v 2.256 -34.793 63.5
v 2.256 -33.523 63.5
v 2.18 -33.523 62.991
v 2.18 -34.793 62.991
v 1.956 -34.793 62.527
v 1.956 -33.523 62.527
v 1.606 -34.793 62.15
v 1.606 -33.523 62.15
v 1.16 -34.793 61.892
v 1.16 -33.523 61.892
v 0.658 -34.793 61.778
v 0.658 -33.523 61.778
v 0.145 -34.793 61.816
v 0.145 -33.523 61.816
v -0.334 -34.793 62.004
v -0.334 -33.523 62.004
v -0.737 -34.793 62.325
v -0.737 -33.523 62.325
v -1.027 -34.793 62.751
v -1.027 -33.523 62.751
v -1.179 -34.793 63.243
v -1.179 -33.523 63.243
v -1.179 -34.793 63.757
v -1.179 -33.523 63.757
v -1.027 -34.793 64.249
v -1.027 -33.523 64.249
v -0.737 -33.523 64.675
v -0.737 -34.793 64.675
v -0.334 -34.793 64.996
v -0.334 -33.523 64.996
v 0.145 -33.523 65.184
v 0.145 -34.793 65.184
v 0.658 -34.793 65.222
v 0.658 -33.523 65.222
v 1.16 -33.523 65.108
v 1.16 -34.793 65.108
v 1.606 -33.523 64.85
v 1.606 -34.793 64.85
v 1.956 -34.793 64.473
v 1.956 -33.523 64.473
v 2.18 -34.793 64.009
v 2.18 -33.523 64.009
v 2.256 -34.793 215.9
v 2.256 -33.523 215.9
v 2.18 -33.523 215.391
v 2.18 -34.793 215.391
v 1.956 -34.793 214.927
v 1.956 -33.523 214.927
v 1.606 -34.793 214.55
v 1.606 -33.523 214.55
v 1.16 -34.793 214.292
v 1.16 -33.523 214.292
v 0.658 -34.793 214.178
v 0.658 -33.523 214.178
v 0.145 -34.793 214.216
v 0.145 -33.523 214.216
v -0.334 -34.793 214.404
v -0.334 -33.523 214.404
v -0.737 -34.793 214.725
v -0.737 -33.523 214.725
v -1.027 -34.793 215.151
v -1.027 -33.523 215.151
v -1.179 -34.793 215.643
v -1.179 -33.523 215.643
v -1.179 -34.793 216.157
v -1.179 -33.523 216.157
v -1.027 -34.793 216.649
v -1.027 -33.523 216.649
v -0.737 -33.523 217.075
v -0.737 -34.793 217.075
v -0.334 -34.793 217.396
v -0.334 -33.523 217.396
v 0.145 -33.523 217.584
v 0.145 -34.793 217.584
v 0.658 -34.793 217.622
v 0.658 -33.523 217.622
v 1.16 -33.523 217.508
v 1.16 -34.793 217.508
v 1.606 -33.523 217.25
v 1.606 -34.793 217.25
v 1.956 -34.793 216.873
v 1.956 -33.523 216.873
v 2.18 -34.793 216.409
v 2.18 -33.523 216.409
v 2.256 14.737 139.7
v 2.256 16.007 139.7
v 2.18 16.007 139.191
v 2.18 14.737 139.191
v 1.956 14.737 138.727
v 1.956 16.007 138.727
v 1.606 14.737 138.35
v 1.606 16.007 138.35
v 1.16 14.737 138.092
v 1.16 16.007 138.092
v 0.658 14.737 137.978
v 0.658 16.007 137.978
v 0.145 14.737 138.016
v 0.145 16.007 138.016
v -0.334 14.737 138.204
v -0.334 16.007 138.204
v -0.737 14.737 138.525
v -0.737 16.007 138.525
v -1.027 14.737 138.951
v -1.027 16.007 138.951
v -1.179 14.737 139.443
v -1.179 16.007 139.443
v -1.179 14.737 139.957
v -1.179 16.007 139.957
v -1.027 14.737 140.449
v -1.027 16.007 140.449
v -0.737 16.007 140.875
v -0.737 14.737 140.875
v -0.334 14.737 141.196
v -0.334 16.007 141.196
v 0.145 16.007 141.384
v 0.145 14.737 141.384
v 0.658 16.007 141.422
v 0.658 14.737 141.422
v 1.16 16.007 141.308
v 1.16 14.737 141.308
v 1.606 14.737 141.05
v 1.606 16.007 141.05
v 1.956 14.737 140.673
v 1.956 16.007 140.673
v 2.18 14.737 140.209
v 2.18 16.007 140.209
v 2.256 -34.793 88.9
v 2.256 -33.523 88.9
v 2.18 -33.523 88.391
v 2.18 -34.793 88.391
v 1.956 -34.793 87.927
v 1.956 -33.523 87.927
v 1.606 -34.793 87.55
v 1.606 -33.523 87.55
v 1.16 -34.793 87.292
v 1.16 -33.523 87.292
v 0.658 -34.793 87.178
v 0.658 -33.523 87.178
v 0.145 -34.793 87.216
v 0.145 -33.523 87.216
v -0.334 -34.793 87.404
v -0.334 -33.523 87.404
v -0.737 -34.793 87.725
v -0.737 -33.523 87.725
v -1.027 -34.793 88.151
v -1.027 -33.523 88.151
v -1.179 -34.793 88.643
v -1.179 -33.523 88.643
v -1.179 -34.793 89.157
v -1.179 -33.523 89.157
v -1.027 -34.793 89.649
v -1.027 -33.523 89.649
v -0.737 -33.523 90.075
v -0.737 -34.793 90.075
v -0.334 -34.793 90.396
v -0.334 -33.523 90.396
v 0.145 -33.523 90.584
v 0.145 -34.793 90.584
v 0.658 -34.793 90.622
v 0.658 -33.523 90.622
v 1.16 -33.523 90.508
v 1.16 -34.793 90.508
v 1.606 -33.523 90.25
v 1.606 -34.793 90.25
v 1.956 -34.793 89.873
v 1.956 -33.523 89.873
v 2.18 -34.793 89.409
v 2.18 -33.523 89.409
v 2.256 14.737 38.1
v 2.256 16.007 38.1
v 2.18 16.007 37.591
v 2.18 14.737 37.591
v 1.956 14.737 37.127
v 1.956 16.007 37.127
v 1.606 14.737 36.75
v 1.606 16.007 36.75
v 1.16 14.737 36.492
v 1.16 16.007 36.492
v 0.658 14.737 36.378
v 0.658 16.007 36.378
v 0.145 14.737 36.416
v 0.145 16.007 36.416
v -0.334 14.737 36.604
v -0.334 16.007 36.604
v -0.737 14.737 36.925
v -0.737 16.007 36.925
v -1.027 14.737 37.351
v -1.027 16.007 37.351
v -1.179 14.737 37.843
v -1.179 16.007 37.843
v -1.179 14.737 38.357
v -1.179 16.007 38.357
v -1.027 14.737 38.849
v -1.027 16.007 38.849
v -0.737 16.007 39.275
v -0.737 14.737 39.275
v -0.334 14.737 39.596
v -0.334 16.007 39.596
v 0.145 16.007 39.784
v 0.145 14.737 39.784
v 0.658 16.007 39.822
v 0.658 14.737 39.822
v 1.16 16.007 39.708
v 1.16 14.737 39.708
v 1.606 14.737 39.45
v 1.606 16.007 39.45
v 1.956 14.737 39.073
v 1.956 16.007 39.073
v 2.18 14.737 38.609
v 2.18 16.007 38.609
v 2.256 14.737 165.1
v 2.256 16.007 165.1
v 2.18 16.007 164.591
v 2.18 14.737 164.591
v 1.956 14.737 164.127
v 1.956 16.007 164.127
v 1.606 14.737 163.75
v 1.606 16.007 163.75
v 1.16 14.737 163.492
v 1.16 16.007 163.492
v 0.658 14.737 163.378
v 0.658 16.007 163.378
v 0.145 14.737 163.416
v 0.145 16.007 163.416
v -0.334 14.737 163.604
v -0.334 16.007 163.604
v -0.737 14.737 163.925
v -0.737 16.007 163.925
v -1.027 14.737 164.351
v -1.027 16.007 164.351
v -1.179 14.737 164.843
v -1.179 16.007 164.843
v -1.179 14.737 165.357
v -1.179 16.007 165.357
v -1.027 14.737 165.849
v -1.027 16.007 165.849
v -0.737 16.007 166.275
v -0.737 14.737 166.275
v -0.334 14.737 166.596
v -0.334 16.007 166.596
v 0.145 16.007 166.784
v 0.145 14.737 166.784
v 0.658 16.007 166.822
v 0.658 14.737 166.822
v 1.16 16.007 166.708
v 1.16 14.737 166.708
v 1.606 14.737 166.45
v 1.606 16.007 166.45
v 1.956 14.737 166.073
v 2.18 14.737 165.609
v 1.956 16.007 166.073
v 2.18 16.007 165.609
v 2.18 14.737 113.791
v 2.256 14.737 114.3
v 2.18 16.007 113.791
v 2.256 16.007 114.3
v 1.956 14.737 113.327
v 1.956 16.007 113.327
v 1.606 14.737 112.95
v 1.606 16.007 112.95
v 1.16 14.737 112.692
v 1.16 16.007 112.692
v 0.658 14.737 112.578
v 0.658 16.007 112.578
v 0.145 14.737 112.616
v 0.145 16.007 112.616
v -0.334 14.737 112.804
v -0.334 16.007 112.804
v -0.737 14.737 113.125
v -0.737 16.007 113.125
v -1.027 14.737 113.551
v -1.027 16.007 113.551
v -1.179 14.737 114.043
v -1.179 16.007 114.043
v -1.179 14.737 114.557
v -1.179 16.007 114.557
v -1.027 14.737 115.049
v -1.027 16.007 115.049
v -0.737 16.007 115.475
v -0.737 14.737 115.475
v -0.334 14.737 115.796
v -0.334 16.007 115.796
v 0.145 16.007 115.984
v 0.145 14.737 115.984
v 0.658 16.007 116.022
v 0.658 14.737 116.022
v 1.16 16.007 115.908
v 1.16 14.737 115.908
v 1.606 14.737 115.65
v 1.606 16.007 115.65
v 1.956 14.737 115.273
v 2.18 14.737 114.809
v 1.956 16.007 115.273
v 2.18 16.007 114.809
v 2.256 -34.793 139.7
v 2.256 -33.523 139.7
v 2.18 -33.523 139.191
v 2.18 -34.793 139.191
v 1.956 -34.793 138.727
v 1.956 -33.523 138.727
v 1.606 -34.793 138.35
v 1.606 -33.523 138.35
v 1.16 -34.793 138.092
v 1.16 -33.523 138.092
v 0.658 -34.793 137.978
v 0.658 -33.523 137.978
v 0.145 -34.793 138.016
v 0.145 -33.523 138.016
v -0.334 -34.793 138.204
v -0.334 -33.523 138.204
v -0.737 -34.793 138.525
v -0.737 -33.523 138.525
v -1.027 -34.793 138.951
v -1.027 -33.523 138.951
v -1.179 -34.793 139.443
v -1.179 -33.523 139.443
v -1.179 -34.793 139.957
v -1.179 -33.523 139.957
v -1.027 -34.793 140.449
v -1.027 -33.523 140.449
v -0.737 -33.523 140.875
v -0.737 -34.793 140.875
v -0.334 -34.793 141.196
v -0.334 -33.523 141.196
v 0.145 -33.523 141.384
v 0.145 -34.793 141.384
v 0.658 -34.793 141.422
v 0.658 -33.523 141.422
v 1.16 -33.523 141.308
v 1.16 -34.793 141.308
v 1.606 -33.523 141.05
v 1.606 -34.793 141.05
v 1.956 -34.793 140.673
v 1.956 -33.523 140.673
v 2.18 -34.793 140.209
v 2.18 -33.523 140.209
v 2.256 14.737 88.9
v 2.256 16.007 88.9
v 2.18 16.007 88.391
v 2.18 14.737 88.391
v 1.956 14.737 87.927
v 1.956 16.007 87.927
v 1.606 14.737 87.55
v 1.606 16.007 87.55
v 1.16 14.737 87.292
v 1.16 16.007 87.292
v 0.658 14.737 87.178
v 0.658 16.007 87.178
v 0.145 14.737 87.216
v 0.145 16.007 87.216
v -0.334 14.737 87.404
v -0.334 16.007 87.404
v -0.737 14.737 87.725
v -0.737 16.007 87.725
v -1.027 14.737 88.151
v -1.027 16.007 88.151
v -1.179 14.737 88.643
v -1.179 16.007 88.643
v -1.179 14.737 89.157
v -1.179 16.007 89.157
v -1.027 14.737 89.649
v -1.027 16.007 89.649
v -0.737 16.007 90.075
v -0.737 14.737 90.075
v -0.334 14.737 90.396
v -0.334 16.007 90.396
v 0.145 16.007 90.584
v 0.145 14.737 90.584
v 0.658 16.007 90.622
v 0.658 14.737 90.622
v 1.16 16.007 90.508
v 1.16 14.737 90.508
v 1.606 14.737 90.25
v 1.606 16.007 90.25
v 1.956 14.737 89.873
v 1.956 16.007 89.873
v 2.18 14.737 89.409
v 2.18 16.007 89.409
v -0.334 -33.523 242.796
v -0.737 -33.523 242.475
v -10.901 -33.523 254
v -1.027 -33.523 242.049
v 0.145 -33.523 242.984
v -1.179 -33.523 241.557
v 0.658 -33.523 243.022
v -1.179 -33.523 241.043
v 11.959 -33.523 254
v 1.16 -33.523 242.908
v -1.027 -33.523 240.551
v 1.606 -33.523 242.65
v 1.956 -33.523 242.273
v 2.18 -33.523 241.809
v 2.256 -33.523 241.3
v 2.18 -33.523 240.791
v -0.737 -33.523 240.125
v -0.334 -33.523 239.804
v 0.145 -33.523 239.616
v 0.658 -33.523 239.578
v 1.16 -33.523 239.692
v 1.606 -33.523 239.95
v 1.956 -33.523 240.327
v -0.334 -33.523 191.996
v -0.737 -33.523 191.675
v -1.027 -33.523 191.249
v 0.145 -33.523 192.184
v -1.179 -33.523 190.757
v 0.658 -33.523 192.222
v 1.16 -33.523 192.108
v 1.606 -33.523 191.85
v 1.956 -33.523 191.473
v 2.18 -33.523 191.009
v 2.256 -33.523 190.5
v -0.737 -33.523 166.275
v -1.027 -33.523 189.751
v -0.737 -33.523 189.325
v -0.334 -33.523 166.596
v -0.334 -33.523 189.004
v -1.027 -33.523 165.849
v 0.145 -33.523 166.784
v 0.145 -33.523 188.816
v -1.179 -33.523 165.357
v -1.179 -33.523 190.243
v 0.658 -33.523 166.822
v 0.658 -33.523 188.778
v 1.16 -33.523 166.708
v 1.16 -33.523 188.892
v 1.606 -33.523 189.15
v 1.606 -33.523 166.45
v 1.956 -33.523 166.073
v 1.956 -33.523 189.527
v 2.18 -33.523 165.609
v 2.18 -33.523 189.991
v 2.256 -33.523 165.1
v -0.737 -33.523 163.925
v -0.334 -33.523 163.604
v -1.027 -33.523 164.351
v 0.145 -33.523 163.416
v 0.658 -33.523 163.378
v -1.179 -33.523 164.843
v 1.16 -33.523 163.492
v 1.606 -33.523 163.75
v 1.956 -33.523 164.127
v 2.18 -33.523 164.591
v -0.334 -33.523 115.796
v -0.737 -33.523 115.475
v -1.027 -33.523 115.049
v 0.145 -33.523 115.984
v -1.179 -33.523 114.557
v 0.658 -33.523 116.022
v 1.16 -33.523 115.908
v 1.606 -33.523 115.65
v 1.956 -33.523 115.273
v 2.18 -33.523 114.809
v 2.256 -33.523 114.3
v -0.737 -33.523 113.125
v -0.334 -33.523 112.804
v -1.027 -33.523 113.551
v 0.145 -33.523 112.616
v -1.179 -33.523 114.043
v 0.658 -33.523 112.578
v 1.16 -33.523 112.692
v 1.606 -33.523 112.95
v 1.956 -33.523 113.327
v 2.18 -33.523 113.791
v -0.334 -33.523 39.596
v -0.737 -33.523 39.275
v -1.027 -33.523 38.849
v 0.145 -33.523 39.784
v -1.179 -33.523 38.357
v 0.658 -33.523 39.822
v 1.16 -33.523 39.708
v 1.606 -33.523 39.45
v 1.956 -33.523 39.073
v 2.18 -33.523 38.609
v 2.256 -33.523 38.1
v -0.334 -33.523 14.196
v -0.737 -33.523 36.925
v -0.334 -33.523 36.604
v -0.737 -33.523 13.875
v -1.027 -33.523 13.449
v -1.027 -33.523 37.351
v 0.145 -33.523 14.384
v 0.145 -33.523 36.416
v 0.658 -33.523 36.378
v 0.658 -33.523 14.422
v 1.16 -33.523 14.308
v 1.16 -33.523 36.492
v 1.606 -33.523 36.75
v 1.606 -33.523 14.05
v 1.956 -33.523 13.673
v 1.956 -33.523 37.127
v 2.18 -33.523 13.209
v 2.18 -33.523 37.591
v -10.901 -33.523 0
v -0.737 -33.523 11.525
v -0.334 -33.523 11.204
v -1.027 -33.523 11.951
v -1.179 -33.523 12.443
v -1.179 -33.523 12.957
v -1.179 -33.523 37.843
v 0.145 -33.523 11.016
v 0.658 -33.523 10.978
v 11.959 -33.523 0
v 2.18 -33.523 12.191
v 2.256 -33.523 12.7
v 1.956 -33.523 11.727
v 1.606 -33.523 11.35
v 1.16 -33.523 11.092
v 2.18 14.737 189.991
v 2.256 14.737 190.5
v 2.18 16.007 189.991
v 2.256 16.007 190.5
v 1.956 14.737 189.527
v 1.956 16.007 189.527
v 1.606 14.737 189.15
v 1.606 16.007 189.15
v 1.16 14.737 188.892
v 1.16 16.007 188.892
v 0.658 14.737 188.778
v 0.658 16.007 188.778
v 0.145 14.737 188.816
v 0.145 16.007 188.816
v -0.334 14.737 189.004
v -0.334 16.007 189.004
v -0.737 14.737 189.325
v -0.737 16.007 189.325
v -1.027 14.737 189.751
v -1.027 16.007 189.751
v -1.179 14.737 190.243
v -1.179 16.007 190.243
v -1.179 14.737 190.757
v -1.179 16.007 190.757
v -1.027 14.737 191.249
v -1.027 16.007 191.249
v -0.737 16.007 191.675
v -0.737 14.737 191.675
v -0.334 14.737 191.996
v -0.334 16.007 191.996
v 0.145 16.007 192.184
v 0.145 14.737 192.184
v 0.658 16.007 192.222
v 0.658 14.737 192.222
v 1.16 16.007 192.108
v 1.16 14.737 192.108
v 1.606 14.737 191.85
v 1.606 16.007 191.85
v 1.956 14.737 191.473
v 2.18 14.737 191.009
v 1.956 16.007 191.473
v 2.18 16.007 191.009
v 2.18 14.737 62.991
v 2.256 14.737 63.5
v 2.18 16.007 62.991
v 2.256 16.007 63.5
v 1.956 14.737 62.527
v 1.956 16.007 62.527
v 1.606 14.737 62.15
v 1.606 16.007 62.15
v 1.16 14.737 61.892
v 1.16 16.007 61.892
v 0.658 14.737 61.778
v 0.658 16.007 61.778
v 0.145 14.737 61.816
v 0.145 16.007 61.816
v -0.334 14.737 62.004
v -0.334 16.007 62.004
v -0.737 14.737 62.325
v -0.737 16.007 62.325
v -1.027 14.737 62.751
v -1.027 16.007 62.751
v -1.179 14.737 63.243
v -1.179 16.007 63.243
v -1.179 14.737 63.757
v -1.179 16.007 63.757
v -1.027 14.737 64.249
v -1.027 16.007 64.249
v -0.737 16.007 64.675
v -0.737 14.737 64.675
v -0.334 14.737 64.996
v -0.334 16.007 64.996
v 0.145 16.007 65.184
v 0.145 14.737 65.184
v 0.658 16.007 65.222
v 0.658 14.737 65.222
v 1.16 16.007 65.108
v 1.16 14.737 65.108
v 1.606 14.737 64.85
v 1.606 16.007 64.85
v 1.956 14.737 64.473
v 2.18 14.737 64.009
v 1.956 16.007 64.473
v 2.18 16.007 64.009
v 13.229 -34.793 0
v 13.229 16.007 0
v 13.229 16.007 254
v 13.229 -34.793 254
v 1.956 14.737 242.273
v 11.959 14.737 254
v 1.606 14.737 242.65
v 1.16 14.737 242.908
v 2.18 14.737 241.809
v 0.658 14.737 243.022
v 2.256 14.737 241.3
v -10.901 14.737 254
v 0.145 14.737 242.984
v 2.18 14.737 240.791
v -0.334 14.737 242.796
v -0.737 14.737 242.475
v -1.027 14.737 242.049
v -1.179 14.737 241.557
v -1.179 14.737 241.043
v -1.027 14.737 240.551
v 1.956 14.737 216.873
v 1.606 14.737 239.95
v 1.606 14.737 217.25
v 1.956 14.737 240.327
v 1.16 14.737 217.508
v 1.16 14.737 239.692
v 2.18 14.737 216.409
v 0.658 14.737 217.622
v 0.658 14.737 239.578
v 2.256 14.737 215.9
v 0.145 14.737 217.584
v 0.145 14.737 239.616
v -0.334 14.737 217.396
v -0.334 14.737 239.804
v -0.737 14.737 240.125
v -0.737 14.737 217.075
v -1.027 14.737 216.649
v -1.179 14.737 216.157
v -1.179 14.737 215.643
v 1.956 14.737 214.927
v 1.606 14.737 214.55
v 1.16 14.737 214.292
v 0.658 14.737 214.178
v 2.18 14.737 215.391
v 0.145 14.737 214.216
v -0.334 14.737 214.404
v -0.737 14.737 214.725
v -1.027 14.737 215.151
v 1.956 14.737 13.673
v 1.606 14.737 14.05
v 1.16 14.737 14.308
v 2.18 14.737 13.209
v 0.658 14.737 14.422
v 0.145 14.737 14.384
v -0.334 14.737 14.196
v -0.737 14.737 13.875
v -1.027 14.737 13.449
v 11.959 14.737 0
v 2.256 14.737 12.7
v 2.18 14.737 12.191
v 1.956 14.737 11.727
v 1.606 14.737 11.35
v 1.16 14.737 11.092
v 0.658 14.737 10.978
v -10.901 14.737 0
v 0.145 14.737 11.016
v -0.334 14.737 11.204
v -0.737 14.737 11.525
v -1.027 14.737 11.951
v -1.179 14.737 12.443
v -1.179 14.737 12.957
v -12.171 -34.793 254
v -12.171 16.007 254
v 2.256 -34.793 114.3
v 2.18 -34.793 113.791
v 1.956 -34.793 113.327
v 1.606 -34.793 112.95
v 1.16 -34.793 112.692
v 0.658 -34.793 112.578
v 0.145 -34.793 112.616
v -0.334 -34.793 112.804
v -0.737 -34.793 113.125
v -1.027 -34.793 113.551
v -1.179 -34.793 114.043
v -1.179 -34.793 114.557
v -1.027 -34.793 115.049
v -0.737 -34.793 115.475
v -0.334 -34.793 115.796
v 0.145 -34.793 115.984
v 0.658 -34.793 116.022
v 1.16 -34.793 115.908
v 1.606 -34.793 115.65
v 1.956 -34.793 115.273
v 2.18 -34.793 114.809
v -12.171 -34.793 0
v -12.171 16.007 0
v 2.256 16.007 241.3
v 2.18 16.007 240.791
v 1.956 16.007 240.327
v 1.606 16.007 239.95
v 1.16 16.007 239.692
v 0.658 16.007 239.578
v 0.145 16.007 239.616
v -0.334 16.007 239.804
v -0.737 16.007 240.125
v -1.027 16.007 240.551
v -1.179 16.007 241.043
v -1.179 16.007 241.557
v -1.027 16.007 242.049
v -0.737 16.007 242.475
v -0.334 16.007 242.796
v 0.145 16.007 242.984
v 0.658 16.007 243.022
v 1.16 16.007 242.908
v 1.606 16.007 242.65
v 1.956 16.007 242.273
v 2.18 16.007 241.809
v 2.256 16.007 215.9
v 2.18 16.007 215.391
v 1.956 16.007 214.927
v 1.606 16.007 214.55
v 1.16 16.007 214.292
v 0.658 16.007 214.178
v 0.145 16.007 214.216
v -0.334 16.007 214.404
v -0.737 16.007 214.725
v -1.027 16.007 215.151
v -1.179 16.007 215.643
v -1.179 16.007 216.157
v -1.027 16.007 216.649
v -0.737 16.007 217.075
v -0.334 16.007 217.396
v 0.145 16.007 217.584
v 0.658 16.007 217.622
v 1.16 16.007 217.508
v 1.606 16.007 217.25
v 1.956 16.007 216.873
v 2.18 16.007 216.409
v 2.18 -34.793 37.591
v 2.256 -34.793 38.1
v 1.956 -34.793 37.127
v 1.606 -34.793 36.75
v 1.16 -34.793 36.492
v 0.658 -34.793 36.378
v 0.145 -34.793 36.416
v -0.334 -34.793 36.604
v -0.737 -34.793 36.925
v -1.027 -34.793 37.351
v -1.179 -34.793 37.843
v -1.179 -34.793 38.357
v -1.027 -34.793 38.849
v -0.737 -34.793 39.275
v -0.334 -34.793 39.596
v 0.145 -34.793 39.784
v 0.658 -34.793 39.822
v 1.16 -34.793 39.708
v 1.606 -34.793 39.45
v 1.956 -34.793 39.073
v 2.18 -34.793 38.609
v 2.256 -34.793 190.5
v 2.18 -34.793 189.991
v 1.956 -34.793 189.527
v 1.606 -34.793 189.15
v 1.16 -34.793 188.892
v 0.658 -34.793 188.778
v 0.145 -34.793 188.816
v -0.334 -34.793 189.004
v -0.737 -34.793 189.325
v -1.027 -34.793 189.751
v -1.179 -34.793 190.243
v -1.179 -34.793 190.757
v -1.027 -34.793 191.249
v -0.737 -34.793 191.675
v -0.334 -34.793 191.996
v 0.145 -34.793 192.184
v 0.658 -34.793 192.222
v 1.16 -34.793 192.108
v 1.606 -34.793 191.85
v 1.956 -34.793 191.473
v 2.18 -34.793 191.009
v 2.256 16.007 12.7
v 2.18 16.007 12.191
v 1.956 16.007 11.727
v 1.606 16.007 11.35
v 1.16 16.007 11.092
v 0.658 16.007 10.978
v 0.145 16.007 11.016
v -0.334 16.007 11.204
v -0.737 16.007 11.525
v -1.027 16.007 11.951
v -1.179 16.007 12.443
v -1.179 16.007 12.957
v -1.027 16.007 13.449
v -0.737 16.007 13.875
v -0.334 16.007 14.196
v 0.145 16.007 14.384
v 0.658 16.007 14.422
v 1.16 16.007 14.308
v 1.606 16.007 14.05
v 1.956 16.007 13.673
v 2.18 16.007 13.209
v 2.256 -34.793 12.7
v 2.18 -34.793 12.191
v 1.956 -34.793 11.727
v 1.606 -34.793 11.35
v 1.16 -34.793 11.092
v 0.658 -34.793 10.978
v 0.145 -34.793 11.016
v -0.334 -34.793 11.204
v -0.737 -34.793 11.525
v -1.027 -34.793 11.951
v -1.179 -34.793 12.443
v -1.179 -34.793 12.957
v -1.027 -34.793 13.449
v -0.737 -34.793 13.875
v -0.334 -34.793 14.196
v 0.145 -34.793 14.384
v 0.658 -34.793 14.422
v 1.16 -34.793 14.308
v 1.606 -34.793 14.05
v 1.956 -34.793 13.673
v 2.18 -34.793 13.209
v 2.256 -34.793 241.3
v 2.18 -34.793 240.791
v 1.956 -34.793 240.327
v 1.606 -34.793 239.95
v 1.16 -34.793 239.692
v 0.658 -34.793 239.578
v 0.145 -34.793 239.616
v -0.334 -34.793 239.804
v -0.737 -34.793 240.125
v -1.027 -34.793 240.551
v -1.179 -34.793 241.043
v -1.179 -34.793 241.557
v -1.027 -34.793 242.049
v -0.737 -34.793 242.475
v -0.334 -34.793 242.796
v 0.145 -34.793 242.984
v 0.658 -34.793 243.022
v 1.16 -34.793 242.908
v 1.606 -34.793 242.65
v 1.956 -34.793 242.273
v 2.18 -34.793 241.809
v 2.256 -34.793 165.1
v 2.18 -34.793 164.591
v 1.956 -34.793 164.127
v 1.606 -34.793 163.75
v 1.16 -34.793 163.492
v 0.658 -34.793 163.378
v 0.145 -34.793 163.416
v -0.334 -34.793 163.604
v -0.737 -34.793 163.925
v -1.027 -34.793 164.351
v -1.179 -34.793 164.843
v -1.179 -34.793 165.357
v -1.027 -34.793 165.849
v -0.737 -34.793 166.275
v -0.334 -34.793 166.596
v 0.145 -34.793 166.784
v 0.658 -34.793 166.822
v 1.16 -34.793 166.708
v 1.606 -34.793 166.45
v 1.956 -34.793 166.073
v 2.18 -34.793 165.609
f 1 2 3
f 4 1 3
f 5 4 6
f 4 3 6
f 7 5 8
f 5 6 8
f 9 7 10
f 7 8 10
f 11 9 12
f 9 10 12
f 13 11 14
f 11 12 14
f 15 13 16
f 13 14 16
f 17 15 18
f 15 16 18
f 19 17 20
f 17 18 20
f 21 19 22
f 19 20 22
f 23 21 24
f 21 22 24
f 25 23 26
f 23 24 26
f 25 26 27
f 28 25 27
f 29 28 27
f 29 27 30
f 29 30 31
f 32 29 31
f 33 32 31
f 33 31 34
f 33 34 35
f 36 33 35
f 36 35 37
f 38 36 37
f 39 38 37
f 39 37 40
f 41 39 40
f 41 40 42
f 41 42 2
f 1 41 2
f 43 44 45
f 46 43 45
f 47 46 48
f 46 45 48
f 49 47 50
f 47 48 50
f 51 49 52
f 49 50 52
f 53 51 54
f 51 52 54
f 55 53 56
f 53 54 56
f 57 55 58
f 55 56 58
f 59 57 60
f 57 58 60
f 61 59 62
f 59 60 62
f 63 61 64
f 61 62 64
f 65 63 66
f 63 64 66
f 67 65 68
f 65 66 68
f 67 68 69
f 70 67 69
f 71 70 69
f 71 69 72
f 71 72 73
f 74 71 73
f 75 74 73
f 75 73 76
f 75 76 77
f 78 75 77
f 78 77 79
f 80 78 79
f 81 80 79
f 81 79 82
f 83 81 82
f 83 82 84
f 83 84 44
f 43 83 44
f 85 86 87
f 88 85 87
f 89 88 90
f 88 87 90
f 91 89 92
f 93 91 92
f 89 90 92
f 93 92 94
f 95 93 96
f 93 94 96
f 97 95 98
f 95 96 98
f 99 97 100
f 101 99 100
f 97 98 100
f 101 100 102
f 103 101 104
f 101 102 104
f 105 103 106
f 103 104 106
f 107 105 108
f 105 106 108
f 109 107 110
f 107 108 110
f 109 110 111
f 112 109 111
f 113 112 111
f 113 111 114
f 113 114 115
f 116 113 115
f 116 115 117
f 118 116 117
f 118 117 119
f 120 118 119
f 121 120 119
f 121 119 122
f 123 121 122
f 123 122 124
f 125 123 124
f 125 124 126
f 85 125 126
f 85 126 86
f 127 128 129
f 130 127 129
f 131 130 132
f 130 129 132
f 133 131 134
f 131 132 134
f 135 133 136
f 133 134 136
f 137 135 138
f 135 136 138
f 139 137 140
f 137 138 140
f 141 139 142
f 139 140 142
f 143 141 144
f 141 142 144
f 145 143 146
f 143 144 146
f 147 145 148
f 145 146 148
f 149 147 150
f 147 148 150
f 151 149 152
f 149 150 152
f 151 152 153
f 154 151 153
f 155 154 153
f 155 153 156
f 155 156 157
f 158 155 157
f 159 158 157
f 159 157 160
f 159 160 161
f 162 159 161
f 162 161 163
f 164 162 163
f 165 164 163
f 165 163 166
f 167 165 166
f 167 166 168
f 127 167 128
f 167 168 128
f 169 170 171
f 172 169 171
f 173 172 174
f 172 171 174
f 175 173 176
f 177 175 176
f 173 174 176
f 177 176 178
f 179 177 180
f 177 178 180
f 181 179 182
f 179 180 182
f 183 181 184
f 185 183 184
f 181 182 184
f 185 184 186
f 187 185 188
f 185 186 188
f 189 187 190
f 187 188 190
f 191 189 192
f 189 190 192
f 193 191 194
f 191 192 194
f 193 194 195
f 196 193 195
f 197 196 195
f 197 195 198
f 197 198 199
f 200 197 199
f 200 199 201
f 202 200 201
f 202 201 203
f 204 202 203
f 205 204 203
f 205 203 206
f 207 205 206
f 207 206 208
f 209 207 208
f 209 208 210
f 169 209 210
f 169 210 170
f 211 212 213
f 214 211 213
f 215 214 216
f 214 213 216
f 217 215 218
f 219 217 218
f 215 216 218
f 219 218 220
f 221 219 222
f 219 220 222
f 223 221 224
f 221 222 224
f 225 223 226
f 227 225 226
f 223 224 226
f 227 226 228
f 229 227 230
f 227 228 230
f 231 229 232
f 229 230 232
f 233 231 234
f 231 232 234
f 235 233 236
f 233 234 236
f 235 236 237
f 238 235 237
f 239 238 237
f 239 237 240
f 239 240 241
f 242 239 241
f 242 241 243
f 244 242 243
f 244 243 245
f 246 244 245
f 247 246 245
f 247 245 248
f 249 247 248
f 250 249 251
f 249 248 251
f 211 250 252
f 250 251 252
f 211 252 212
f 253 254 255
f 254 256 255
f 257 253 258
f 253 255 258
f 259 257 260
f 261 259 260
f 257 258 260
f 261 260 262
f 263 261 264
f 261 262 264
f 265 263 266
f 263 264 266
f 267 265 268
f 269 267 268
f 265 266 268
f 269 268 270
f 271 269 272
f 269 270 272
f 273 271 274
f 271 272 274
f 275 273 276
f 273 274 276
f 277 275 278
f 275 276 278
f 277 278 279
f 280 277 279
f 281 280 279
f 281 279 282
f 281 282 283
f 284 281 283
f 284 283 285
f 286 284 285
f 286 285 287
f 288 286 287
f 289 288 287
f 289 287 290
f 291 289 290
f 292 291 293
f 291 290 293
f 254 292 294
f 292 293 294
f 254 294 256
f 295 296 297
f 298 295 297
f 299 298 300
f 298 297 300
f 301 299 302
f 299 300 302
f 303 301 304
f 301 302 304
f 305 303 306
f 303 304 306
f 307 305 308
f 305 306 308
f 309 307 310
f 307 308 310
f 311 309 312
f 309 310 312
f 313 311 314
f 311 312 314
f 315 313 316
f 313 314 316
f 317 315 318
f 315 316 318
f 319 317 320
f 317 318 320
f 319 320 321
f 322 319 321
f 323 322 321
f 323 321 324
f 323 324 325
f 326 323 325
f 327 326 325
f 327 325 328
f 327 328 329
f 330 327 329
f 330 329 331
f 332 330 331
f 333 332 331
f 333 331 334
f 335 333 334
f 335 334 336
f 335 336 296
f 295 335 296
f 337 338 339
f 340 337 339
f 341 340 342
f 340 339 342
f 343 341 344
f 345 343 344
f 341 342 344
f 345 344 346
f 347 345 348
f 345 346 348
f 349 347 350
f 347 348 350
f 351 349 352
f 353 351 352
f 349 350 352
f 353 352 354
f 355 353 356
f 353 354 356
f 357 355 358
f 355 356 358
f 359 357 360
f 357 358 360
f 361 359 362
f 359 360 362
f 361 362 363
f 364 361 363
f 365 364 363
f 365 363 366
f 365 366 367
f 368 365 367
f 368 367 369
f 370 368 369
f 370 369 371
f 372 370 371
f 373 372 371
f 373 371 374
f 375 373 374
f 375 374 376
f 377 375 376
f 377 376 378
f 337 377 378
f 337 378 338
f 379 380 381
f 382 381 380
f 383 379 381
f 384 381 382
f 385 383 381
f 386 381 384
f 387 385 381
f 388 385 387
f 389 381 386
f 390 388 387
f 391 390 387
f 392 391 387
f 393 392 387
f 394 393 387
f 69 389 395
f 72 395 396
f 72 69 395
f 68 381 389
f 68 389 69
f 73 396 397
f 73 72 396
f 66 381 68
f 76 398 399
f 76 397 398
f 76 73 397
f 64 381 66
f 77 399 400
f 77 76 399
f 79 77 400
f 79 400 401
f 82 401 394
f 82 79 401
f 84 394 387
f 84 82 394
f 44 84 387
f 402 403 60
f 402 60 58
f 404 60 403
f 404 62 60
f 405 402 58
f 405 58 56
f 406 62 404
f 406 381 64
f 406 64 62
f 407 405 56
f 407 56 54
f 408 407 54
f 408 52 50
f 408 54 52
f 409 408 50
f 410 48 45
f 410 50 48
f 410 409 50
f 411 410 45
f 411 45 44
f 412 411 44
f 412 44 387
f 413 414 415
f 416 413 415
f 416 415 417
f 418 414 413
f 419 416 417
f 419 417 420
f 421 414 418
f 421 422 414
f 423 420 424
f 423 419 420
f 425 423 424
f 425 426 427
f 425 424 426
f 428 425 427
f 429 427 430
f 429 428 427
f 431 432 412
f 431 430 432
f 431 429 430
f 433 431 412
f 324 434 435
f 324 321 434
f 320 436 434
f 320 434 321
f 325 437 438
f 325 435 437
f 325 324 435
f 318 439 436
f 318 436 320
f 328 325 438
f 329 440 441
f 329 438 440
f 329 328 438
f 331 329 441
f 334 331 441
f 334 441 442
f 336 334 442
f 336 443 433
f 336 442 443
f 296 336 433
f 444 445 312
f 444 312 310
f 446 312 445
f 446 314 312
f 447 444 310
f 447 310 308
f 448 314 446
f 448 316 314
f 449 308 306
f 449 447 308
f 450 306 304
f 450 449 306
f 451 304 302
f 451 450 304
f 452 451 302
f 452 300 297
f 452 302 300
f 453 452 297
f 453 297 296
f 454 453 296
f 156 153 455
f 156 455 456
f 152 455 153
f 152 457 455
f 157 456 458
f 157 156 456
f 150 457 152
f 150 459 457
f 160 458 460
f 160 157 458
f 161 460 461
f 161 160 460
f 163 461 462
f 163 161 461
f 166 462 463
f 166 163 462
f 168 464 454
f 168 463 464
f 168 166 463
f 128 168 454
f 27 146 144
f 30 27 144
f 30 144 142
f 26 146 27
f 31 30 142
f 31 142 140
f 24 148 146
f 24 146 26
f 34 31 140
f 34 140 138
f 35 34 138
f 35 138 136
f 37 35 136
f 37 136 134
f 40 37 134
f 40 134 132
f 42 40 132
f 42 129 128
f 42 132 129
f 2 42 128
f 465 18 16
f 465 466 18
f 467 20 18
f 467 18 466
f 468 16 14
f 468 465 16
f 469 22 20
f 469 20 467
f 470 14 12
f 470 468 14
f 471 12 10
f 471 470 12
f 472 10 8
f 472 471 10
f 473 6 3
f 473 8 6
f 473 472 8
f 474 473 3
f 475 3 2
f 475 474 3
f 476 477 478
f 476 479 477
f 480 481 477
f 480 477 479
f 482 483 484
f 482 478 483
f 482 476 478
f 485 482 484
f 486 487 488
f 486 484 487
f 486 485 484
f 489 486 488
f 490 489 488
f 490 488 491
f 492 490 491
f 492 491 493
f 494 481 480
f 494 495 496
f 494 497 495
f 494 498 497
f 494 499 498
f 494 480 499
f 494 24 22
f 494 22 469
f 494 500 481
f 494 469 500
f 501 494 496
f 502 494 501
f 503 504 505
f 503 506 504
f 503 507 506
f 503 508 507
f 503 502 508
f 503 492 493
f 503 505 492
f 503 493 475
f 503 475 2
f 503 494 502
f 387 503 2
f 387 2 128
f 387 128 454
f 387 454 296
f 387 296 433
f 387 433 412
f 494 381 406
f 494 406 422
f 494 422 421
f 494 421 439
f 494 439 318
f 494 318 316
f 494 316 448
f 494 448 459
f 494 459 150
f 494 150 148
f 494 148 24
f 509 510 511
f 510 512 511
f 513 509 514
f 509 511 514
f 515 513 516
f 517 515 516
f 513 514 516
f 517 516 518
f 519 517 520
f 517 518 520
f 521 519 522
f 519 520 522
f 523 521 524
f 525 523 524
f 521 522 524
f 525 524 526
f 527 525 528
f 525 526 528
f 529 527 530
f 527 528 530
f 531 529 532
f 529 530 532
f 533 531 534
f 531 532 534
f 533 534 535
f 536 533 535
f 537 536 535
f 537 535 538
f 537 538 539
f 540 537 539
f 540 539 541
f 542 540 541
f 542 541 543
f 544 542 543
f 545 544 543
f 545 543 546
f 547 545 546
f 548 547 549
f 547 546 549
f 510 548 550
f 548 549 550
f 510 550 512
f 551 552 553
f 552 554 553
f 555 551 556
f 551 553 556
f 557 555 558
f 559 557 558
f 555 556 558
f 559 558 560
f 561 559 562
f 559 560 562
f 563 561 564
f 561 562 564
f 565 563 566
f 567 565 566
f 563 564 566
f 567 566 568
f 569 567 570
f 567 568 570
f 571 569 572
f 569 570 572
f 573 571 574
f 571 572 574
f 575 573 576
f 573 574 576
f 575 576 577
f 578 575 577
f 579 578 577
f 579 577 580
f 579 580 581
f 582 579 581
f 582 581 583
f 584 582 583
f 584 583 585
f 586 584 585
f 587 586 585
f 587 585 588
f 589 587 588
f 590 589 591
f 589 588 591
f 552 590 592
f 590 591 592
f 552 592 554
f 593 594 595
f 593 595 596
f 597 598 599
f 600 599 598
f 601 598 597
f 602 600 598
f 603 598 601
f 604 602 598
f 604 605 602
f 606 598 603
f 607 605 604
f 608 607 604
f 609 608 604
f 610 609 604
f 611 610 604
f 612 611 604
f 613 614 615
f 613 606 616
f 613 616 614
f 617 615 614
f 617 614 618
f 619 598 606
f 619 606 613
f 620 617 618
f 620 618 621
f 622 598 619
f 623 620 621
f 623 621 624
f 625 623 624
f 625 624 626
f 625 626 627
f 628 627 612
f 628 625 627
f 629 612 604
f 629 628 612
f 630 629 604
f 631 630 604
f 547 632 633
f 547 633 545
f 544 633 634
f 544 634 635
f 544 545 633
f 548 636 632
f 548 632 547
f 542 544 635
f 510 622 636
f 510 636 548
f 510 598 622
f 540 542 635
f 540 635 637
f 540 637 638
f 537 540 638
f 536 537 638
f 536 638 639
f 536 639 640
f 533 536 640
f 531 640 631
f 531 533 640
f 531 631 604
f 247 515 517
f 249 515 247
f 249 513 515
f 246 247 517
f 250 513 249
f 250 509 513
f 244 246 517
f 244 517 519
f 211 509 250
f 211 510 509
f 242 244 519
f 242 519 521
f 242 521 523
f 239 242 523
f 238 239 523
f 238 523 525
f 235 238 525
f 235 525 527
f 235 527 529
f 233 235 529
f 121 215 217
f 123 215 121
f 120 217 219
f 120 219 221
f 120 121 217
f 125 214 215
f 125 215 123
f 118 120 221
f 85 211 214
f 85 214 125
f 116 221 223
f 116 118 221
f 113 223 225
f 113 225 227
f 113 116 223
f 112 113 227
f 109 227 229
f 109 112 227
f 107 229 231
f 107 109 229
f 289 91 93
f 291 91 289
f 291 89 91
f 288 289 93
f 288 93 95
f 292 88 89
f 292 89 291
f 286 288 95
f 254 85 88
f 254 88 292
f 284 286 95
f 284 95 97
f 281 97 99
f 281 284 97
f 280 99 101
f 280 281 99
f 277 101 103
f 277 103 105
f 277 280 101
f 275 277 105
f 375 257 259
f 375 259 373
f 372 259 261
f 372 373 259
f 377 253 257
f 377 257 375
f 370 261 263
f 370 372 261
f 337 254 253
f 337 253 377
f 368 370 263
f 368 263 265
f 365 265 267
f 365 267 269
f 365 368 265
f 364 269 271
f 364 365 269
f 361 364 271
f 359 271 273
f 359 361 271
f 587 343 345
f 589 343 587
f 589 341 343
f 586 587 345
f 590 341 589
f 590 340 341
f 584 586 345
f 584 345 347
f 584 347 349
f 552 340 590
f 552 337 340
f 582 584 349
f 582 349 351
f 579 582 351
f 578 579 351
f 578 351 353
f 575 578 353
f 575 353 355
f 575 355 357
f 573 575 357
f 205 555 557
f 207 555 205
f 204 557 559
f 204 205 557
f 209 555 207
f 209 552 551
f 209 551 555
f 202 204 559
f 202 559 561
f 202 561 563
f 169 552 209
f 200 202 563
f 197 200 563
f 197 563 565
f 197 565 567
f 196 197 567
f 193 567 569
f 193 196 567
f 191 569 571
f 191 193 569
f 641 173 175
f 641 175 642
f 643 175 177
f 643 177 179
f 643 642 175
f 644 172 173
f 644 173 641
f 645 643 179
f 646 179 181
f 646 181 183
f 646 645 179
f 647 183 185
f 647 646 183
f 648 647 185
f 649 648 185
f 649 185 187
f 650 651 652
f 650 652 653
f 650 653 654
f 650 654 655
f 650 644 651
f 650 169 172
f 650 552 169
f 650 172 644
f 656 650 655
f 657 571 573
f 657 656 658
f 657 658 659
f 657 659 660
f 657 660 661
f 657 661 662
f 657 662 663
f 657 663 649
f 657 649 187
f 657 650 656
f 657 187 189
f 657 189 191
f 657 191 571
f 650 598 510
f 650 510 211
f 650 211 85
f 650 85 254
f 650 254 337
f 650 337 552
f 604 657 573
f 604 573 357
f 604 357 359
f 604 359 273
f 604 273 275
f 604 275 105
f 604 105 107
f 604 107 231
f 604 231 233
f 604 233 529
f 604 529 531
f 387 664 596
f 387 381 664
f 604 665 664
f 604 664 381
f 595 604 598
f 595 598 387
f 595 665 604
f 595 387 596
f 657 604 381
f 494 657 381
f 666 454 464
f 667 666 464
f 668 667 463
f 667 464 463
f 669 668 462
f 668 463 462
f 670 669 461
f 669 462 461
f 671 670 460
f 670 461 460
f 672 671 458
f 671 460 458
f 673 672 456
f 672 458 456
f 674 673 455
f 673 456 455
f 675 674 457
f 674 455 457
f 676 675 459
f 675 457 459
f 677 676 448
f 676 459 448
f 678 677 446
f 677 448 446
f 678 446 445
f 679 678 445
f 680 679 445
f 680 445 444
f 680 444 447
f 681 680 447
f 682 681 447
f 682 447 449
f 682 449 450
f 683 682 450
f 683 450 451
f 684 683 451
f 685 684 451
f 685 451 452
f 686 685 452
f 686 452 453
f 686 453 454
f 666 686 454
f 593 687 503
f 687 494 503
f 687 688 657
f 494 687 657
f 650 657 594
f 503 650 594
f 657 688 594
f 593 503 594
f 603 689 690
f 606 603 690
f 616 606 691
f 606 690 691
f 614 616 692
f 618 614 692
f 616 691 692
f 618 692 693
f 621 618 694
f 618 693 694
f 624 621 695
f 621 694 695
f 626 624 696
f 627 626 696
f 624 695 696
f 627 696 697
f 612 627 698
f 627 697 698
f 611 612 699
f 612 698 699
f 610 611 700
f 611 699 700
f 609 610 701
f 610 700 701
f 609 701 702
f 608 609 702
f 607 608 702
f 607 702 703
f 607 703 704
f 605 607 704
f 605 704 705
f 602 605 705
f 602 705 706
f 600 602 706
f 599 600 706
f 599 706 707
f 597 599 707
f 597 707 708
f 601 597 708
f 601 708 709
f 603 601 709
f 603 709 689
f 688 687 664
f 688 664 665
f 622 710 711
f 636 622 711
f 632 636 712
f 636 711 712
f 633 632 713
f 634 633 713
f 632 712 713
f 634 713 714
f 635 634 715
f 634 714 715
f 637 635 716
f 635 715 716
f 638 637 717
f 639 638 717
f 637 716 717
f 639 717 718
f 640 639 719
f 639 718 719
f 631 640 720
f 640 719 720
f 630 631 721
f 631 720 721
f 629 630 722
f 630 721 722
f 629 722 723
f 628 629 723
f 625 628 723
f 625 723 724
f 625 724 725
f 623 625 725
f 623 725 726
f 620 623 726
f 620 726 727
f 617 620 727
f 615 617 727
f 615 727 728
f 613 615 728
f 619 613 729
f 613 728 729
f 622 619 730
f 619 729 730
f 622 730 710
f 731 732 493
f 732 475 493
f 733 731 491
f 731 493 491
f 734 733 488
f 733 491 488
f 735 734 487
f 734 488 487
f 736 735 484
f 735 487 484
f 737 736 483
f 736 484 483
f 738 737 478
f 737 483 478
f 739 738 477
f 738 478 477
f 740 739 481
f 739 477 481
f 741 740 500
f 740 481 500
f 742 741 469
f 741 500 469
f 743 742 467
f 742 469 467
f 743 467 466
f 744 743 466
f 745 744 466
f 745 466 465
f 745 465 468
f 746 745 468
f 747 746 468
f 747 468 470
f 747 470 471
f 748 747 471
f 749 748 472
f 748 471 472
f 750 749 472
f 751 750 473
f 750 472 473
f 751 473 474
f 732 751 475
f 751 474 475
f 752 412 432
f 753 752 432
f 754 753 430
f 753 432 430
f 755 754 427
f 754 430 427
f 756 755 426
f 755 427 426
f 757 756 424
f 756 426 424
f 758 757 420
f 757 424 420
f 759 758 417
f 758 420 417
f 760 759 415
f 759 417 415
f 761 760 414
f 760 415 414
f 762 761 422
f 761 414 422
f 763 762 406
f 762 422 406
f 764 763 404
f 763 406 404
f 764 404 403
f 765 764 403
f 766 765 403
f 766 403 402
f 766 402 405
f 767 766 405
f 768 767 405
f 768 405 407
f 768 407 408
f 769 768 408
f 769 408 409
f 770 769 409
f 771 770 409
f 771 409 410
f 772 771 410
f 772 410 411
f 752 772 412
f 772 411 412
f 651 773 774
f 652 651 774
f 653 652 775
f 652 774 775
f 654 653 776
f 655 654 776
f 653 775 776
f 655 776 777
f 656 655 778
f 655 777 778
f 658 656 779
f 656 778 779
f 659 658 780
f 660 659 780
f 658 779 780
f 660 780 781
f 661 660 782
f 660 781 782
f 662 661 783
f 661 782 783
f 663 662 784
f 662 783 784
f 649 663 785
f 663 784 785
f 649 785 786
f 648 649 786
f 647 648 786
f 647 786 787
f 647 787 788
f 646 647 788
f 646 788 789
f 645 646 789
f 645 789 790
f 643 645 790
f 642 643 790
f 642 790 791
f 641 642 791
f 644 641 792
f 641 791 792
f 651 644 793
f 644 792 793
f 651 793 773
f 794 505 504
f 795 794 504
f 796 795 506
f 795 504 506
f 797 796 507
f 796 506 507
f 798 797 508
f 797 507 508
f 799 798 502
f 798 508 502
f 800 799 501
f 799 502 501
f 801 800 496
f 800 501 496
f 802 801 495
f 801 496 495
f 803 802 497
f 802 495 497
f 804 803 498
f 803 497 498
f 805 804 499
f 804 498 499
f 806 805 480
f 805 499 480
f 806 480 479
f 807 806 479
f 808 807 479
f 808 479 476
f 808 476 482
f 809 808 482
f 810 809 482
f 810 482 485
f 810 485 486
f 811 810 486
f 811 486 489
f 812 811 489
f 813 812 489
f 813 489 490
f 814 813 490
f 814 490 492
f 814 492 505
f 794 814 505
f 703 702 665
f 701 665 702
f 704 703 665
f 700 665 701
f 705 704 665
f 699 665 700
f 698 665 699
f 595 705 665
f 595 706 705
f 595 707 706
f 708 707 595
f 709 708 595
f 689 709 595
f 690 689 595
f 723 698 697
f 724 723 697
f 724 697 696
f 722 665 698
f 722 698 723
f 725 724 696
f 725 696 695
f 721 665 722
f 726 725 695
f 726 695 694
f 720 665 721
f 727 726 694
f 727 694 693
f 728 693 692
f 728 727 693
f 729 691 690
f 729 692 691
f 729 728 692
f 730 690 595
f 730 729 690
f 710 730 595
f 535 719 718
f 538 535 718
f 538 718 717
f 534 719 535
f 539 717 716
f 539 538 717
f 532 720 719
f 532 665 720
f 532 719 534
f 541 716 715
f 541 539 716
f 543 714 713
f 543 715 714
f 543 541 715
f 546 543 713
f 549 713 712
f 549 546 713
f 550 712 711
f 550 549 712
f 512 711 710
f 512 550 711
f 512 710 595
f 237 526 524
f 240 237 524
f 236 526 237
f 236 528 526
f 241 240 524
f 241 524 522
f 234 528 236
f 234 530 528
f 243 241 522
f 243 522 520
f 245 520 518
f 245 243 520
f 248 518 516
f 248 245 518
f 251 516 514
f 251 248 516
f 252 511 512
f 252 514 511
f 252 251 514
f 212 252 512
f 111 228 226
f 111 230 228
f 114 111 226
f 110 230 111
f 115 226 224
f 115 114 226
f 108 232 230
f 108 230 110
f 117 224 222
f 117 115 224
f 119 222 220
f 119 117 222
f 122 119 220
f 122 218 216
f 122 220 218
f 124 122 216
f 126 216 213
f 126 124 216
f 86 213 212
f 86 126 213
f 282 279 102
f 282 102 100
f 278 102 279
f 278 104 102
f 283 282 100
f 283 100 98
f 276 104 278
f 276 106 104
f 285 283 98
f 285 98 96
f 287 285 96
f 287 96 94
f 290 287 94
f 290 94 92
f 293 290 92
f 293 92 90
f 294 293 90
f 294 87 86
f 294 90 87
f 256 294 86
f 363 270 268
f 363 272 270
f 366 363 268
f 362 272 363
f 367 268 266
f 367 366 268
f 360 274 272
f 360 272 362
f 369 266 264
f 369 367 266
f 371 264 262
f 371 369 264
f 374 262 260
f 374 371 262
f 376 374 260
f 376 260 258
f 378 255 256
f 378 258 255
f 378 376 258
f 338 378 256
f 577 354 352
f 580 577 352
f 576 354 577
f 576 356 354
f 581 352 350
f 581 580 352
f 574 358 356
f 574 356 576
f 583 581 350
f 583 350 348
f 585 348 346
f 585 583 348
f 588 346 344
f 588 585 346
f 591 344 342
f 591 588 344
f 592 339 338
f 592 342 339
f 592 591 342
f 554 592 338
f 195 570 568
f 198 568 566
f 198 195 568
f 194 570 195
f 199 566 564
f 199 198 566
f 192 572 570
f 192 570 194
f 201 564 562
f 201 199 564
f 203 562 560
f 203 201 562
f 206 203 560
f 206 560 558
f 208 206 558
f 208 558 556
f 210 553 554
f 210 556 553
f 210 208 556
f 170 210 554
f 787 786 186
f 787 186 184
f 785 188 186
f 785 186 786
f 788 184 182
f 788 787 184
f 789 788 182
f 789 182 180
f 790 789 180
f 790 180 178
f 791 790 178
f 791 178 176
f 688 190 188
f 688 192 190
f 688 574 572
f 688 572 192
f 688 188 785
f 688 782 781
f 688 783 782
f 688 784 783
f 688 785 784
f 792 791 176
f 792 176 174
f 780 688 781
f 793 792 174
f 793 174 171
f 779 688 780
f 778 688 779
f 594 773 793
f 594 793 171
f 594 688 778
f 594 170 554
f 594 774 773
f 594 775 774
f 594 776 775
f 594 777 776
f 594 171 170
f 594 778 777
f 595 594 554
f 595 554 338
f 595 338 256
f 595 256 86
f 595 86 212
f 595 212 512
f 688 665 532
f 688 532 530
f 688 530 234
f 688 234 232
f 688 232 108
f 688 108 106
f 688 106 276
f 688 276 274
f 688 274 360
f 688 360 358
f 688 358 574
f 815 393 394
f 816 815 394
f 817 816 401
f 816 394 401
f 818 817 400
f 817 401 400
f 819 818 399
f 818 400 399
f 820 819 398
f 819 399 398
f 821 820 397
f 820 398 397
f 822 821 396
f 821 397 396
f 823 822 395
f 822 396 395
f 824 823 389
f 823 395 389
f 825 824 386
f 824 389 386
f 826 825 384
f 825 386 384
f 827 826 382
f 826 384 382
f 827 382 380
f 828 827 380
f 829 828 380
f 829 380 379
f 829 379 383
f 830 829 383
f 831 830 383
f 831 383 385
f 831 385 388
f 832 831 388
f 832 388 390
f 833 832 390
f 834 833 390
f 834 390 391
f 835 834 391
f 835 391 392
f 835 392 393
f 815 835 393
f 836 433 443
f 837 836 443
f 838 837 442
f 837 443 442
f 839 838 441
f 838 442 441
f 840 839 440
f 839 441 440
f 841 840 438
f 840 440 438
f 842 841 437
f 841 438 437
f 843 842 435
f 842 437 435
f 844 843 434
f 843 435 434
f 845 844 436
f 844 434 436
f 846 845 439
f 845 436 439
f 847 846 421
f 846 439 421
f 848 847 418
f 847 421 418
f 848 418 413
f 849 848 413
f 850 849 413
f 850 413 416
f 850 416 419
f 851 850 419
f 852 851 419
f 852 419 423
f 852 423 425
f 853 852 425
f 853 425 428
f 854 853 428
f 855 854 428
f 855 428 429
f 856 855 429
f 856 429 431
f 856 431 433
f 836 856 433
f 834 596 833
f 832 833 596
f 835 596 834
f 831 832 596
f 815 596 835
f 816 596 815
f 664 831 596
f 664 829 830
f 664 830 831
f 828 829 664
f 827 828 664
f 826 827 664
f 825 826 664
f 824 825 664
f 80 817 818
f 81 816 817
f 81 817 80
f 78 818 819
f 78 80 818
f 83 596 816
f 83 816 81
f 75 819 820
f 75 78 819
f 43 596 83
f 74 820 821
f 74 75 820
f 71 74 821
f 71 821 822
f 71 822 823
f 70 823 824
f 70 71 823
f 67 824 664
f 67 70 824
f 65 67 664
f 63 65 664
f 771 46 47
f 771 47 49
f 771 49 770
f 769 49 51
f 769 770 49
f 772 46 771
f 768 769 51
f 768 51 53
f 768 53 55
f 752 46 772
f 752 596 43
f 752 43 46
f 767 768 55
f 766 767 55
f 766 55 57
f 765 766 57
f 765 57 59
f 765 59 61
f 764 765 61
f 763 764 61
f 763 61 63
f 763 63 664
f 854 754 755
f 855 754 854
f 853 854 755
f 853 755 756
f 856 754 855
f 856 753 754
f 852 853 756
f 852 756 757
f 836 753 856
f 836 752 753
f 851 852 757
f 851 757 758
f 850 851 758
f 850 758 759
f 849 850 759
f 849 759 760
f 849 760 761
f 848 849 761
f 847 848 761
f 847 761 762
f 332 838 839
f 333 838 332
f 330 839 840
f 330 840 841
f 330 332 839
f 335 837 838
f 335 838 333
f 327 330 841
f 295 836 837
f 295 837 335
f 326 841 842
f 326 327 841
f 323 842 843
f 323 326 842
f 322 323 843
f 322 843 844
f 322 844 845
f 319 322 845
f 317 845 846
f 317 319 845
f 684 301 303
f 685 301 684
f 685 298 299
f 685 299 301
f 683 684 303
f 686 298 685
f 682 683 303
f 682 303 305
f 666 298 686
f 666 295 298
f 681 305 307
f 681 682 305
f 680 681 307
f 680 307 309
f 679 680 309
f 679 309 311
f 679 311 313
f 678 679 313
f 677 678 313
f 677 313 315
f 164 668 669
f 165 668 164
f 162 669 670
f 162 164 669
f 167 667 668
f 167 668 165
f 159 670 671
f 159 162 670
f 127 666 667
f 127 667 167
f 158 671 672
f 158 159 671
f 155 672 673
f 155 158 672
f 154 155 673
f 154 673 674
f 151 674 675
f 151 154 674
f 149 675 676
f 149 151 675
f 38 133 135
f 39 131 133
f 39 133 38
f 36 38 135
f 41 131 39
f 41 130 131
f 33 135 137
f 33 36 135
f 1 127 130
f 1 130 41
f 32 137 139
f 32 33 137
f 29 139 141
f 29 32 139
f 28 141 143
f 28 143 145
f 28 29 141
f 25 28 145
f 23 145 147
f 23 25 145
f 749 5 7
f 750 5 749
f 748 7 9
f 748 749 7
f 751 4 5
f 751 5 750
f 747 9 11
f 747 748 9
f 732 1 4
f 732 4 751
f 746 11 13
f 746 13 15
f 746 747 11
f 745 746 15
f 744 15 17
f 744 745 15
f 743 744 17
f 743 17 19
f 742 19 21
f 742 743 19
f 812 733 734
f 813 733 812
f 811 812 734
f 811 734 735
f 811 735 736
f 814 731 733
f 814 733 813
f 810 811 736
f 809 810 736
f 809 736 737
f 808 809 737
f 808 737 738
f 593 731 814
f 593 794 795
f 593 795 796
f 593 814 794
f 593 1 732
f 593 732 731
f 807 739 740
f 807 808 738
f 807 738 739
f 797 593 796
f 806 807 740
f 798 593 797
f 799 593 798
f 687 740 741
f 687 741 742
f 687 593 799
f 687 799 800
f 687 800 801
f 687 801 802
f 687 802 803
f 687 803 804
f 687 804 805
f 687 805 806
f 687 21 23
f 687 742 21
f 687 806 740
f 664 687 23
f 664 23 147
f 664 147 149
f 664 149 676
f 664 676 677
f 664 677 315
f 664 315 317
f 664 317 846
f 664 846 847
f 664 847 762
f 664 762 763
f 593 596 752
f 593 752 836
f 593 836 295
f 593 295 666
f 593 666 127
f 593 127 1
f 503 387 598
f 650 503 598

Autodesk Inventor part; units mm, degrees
ref_plane "YZ Plane" through (0, 0, 0) normal (1, 0, 0) x (0, 1, 0)
ref_plane "XZ Plane" through (0, 0, 0) normal (0, 1, 0) x (-1, 0, 0)
ref_plane "XY Plane" through (0, 0, 0) normal (0, 0, 1) x (1, 0, 0)
sketch "Sketch1" plane through (0, 0, 0) normal (0, 0, 1) x (1, 0, 0)
  line L0 (-12.1708, 16.0073) -> (13.2292, 16.0073)
  line L1 (13.2292, 16.0073) -> (13.2292, -34.7927)
  line L2 (13.2292, -34.7927) -> (-12.1708, -34.7927)
  line L3 (-12.1708, -34.7927) -> (-12.1708, 16.0073)
  line L4 (11.9592, 14.7373) -> (-10.9008, 14.7373)
  line L5 (-10.9008, 14.7373) -> (-10.9008, -33.5227)
  line L6 (-10.9008, -33.5227) -> (11.9592, -33.5227)
  line L7 (11.9592, -33.5227) -> (11.9592, 14.7373)
  point P0 (0, 0)
  dimension "d0" = 25.4
  dimension "d1" = 50.8
  dimension "d2" = 1.27
extrude "Extrusion1" add sketch "Sketch1" along normal blind 254
sketch "Sketch2" plane through (-12.1708, 16.0073, 0) normal (0, 1, 0) x (1, 0, 0)
  circle A0 centre (12.7, -12.7) radius 1.7272
  line L0 (25.4, 0) -> (0, 0) projected
  line L1 (0, 0) -> (0, -254) projected
  point P0 (12.1708, 0)
  dimension "d5" = 3.4544
  dimension "d6" = 12.7
  dimension "d7" = 12.7
extrude "Extrusion2" cut sketch "Sketch2" against normal through all
pattern_linear "Rectangular Pattern1" count 10 spacing 25.4 along (0, 0, 1) of "Extrusion2"
equation "\"d3\" = d13"
equation "\"d13\" = 254"
properties part number "VerseFrame 10in"
